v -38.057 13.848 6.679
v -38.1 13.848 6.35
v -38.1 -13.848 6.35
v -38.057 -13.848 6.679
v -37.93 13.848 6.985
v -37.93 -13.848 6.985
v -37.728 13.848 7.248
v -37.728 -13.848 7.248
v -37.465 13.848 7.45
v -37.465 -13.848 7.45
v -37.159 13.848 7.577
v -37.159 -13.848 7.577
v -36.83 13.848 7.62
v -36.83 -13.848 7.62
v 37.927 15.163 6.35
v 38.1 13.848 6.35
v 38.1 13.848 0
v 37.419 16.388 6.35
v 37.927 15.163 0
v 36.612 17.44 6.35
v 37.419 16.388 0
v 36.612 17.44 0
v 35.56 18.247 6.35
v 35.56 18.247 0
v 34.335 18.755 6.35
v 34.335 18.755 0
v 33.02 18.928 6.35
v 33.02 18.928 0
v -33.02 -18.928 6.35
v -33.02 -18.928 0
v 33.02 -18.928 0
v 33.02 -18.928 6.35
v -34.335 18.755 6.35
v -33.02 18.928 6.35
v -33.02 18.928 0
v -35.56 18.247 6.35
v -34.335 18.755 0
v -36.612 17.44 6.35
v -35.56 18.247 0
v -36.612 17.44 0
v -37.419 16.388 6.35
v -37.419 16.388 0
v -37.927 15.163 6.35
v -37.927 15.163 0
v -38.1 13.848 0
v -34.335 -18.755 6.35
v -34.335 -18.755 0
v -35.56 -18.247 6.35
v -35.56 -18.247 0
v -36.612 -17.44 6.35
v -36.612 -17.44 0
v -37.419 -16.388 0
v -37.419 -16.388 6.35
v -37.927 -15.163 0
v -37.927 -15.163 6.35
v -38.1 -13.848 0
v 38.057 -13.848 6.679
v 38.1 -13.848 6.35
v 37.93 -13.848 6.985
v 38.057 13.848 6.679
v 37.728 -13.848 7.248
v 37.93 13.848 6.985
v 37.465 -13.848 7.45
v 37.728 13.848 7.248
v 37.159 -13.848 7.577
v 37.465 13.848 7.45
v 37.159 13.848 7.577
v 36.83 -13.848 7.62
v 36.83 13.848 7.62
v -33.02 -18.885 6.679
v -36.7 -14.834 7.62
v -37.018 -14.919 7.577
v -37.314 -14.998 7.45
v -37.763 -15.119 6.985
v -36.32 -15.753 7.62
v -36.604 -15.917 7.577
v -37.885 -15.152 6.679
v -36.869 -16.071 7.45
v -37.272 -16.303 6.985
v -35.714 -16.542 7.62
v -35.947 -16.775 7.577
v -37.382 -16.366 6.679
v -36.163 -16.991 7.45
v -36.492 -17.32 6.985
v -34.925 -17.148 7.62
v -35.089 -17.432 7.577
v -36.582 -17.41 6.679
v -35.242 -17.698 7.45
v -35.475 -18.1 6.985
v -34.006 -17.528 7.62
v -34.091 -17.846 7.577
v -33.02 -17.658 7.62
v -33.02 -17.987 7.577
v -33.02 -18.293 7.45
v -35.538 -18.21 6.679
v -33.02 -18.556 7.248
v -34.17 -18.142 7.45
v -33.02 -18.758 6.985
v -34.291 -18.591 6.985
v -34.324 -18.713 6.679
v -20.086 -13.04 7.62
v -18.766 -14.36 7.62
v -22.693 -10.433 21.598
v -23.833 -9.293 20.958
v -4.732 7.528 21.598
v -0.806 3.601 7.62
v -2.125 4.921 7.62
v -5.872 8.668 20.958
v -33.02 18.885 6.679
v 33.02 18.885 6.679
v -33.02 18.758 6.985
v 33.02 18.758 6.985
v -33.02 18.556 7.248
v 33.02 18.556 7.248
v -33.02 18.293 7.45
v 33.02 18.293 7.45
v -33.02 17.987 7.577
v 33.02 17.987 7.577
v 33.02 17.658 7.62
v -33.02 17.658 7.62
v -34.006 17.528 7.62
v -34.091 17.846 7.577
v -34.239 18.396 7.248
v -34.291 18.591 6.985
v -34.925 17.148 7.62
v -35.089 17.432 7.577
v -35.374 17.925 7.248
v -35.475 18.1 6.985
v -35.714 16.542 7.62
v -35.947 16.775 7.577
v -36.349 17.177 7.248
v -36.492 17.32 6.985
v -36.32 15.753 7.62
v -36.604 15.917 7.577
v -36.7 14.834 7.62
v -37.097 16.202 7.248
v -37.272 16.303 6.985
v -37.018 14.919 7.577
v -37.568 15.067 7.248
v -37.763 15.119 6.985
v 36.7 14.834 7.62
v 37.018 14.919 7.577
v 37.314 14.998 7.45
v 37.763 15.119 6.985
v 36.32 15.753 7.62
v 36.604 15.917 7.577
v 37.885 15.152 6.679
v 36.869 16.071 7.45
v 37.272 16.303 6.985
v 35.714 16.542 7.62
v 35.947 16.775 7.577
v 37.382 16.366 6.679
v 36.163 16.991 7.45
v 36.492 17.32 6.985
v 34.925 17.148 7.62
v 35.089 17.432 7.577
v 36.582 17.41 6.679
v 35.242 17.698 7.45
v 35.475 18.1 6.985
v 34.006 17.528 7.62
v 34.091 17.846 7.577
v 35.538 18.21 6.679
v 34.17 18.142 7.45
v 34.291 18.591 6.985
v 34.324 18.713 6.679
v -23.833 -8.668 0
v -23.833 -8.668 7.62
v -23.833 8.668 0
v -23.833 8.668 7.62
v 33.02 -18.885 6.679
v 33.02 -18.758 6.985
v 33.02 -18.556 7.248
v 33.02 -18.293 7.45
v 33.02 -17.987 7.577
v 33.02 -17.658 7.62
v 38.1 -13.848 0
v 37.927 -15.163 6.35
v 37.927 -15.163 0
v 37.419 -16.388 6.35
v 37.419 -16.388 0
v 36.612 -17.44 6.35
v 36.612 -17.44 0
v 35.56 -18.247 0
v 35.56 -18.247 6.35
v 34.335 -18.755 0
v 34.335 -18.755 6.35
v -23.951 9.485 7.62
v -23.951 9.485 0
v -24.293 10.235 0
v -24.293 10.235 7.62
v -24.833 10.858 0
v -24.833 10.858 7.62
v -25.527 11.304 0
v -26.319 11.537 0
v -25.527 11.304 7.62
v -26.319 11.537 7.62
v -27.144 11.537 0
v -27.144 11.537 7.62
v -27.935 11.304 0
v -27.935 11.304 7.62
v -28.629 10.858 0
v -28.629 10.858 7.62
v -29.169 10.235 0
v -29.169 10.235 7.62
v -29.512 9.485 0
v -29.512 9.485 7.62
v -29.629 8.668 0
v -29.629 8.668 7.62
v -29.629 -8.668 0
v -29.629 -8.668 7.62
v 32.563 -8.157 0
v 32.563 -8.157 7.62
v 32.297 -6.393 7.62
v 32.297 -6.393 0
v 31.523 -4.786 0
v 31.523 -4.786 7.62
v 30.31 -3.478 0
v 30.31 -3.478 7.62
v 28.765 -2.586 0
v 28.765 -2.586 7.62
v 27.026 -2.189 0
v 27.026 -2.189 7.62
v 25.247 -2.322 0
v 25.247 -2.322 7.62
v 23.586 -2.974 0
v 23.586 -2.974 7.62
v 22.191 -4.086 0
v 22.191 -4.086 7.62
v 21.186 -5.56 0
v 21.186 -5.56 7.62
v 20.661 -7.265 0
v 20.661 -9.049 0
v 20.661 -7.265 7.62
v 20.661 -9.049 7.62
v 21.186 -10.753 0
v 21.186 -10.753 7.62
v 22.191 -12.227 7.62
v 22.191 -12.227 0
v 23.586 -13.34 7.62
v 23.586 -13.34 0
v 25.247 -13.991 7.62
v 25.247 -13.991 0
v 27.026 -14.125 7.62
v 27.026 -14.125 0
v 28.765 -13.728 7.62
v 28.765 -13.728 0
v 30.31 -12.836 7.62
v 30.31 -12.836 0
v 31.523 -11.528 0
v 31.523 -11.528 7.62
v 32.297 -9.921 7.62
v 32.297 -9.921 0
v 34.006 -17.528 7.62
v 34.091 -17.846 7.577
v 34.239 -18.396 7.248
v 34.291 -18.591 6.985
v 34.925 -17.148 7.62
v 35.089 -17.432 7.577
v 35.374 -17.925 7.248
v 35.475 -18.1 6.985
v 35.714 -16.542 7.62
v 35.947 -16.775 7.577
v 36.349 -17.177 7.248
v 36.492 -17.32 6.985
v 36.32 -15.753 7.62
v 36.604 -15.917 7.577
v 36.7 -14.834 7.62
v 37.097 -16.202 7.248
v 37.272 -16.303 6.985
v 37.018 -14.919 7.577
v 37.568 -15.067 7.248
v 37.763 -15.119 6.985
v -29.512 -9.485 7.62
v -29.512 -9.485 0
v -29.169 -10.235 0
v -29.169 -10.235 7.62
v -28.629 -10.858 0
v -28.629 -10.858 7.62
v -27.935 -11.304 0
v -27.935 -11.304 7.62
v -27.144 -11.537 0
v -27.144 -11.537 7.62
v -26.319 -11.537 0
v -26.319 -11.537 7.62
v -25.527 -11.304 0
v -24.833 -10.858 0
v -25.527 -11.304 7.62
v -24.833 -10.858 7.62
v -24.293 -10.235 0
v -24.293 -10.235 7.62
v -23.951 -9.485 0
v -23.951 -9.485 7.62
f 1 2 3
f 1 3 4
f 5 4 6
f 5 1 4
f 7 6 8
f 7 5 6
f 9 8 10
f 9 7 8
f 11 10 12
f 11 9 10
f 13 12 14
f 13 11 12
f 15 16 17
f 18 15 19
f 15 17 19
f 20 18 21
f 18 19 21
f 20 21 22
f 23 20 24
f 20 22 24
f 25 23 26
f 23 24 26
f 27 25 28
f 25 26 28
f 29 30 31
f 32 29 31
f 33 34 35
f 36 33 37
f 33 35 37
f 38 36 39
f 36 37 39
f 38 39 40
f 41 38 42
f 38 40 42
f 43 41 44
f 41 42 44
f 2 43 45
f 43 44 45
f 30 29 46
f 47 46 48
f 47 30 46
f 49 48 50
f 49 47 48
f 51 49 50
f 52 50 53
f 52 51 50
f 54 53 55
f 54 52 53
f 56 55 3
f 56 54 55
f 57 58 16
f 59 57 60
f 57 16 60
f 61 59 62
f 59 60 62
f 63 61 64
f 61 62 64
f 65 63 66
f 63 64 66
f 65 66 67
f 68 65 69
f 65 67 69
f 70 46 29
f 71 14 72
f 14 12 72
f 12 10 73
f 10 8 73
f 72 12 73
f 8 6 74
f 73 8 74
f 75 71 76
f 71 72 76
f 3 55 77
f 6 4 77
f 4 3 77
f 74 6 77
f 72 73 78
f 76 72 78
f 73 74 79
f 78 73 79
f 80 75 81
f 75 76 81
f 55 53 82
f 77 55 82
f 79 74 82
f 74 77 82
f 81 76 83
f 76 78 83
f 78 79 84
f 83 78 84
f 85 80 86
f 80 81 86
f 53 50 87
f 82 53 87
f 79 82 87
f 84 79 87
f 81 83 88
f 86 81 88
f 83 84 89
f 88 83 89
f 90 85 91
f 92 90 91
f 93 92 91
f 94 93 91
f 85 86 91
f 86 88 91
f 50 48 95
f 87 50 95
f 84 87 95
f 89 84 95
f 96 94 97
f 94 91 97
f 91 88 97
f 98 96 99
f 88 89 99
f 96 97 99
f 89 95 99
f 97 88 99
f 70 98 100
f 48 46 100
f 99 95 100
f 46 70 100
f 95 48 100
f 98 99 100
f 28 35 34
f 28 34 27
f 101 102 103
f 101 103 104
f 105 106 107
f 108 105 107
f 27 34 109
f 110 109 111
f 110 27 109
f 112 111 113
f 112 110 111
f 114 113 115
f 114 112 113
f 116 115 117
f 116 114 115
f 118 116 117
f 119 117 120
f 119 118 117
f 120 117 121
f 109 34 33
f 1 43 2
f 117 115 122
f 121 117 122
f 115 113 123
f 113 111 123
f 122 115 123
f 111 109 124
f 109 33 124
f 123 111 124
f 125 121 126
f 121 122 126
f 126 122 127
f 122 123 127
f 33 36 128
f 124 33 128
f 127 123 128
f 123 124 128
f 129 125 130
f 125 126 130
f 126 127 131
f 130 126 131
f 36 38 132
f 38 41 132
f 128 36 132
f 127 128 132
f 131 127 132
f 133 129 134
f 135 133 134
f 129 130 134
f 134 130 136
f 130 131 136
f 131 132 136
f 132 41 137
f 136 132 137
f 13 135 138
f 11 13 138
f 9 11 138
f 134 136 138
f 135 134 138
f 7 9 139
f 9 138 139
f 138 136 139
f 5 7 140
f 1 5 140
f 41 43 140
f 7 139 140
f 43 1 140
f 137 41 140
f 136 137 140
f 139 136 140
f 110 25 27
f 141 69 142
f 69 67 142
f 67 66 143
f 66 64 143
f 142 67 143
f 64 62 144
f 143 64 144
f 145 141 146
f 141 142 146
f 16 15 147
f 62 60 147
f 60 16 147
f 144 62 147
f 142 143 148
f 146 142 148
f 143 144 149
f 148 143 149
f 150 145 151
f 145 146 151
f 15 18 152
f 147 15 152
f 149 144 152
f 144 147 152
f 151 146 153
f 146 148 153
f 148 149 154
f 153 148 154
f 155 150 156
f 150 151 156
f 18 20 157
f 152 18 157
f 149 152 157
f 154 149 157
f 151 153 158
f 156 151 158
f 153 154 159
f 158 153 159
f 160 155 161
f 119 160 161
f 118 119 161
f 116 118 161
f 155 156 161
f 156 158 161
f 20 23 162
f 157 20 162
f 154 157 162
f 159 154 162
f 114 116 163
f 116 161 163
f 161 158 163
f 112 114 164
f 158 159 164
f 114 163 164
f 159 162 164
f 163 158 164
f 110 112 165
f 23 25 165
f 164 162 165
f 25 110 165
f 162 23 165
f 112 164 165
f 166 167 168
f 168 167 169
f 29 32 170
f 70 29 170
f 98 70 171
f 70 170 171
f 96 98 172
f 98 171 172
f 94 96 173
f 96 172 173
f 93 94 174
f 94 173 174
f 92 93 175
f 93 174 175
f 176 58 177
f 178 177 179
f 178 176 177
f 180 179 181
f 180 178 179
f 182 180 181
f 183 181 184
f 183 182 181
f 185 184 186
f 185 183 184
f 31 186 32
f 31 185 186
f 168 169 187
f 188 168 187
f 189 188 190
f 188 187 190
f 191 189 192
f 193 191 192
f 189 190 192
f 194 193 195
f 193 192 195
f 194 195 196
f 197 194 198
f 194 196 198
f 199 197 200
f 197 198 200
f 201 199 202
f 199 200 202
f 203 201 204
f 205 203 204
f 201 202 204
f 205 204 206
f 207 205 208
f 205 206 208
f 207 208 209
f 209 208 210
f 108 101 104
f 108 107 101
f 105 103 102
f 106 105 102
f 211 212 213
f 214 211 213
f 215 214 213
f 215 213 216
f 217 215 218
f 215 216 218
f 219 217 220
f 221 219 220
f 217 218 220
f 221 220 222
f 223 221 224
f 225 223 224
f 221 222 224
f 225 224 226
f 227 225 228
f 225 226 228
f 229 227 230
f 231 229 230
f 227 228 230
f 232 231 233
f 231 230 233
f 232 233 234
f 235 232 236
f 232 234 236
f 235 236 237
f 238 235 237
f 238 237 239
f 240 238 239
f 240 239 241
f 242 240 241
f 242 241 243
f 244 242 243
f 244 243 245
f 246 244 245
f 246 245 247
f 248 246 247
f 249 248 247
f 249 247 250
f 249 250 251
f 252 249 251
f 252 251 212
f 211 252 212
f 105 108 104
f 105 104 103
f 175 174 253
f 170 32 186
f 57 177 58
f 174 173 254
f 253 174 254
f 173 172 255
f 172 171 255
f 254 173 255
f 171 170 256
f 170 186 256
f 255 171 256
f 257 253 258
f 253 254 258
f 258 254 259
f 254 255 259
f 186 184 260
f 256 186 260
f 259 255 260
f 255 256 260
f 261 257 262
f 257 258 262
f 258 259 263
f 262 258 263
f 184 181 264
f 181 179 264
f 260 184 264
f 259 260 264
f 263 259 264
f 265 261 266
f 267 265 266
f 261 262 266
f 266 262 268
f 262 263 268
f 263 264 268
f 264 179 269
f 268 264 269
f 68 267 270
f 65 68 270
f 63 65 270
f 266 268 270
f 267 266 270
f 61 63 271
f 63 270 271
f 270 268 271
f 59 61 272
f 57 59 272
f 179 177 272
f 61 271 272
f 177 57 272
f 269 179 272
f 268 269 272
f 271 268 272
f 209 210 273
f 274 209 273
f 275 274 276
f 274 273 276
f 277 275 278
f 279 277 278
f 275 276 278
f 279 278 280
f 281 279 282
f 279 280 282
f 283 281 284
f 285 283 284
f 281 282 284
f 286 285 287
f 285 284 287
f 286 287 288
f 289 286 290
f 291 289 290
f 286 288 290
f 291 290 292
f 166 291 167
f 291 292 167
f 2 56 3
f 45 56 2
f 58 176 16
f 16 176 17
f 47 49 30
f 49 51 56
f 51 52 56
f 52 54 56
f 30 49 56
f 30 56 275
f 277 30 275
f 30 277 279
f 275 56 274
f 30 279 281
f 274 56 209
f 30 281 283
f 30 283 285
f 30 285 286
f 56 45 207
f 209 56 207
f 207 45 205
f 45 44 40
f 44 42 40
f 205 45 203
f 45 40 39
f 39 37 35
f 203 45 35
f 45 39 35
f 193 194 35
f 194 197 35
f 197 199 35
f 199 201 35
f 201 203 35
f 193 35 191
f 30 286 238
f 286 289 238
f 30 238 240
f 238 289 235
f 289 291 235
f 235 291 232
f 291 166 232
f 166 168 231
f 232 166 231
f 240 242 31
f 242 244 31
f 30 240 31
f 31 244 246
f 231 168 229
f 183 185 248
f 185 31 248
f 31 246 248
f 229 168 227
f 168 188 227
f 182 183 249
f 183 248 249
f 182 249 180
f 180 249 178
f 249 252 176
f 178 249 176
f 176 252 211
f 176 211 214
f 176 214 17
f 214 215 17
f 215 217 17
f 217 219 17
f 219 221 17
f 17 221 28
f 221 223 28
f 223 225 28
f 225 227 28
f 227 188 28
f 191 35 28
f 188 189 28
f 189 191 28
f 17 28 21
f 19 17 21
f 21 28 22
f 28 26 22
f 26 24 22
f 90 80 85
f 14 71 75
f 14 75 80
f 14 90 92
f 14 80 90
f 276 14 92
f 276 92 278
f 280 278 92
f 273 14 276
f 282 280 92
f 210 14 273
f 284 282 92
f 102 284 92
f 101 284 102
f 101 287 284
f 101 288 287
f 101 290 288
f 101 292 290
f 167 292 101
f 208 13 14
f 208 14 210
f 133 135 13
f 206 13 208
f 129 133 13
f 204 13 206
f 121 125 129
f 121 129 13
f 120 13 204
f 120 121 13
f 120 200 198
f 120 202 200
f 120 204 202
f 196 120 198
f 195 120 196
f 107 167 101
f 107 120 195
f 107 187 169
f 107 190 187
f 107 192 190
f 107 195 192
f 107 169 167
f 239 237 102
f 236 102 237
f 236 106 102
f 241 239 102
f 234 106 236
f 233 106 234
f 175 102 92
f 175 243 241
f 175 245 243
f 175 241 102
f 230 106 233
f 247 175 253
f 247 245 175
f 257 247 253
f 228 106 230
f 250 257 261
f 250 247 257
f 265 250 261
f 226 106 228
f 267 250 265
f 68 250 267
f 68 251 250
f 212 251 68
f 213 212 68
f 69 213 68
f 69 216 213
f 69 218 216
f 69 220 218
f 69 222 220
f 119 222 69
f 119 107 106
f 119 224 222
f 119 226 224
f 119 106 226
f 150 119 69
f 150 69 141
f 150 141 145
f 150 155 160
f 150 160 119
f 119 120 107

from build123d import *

# Parameters (mm, degrees)
F0_W         = 76.2
F0_H         = 37.856084797
F1_DEPTH     = 7.62
F2_R         = 1.27
F3_T1_DEPTH  = 20.32
F3_T4_ANGLE  = 90
F3_T6_ANGLE  = 90
F3_T8_ANGLE  = 90
F3_T10_ANGLE = 90
F5_DEPTH     = 25.4
F6_R         = 5.9846476777
F7_DEPTH     = 25.4
F10_DEPTH    = 12.7


# Not quite as in the source:
# - a fillet or chamfer that OpenCascade refuses, or shapes differently, is made with other operations: its cross-section is extruded or revolved along the edge and cut away or added


with BuildPart() as f1:
    # F0 (on Top) → F1 (new body)
    with BuildSketch(Plane.XY):
        Rectangle(F0_W, F0_H)
    extrude(amount=F1_DEPTH)

    # F2
    f2_edges = [f1.edges().sort_by_distance(p)[0] for p in [
        (-38.1, 0, 7.62),
        (0, 18.928042, 7.62),
        (38.1, 0, 7.62),
        (0, -18.928042, 7.62),
    ]]
    fillet(f2_edges, radius=F2_R)

    # F3: fillet of radius 5.08 on 4 edges, made by hand

    # F3_s2 → F3_t1 (cut)
    with BuildSketch(Plane.XY.offset(-12.7)):
        with BuildLine():
            ThreePointArc((-33.02, -18.9280423985), (-36.6121024484, -17.4401448469), (-38.1, -13.8480423985))
            Line((-38.1, -13.8480423985), (-38.1, -18.9280423985))
            Line((-38.1, -18.9280423985), (-33.02, -18.9280423985))
        make_face()
        with BuildLine():
            ThreePointArc((-33.02, 18.9280423985), (-36.6121024484, 17.4401448469), (-38.1, 13.8480423985))
            Line((-38.1, 13.8480423985), (-38.1, 18.9280423985))
            Line((-38.1, 18.9280423985), (-33.02, 18.9280423985))
        make_face()
        with BuildLine():
            ThreePointArc((38.1, 13.8480423985), (36.6121024484, 17.4401448469), (33.02, 18.9280423985))
            Line((33.02, 18.9280423985), (38.1, 18.9280423985))
            Line((38.1, 18.9280423985), (38.1, 13.8480423985))
        make_face()
        with BuildLine():
            ThreePointArc((38.1, -13.8480423985), (36.6121024484, -17.4401448469), (33.02, -18.9280423985))
            Line((33.02, -18.9280423985), (38.1, -18.9280423985))
            Line((38.1, -18.9280423985), (38.1, -13.8480423985))
        make_face()
    extrude(amount=F3_T1_DEPTH, mode=Mode.SUBTRACT)

    # F3_s3 → F3_t4 (revolve, cut)
    with BuildSketch(Plane.YZ.offset(33.02)):
        with BuildLine():
            ThreePointArc((-17.6580423985, 7.62), (-18.5560680106, 7.2480256121), (-18.9280423985, 6.35))
            Line((-18.9280423985, 6.35), (-18.9280423985, 7.62))
            Line((-18.9280423985, 7.62), (-17.6580423985, 7.62))
        make_face()
    revolve(axis=Axis((33.02, -13.8480423985, 7.62), (0, 0, 1)), revolution_arc=F3_T4_ANGLE, mode=Mode.SUBTRACT)

    # F3_s5 → F3_t6 (revolve, cut)
    with BuildSketch(Plane.XZ.offset(-13.8480423985)):
        with BuildLine():
            ThreePointArc((36.83, 7.62), (37.7280256121, 7.2480256121), (38.1, 6.35))
            Line((38.1, 6.35), (38.1, 7.62))
            Line((38.1, 7.62), (36.83, 7.62))
        make_face()
    revolve(axis=Axis((33.02, 13.8480423985, 7.62), (0, 0, 1)), revolution_arc=F3_T6_ANGLE, mode=Mode.SUBTRACT)

    # F3_s7 → F3_t8 (revolve, cut)
    with BuildSketch(Plane.YZ.offset(-33.02)):
        with BuildLine():
            ThreePointArc((17.6580423985, 7.62), (18.5560680106, 7.2480256121), (18.9280423985, 6.35))
            Line((18.9280423985, 6.35), (18.9280423985, 7.62))
            Line((18.9280423985, 7.62), (17.6580423985, 7.62))
        make_face()
    revolve(axis=Axis((-33.02, 13.8480423985, 7.62), (0, 0, 1)), revolution_arc=F3_T8_ANGLE, mode=Mode.SUBTRACT)

    # F3_s9 → F3_t10 (revolve, cut)
    with BuildSketch(Plane.XZ.offset(13.8480423985)):
        with BuildLine():
            ThreePointArc((-36.83, 7.62), (-37.7280256121, 7.2480256121), (-38.1, 6.35))
            Line((-38.1, 6.35), (-38.1, 7.62))
            Line((-38.1, 7.62), (-36.83, 7.62))
        make_face()
    revolve(axis=Axis((-33.02, -13.8480423985, 7.62), (0, 0, 1)), revolution_arc=F3_T10_ANGLE, mode=Mode.SUBTRACT)

    # F4 (on face) → F5 (cut)
    with BuildSketch(Plane.XY.offset(7.62)):
        with BuildLine():
            Line((-29.6291131526, 8.6681647226), (-29.6291131526, 0))
            Line((-29.6291131526, 0), (-29.6291131526, -8.6681647226))
            ThreePointArc((-29.6291131526, -8.6681647226), (-26.7311763018, -11.5661015734), (-23.8332394511, -8.6681647226))
            Line((-23.8332394511, -8.6681647226), (-23.8332394511, 0))
            Line((-23.8332394511, 0), (-23.8332394511, 8.6681647226))
            ThreePointArc((-23.8332394511, 8.6681647226), (-26.7311763018, 11.5661015734), (-29.6291131526, 8.6681647226))
        make_face()
    extrude(amount=-F5_DEPTH, mode=Mode.SUBTRACT)

    # F6 (on face) → F7 (cut)
    with BuildSketch(Plane.XY.offset(7.62)):
        with Locations((26.5783518553, -8.1568043679)):
            Circle(F6_R)
    extrude(amount=-F7_DEPTH, mode=Mode.SUBTRACT)

    # F9 (on face) → F10 (join, symmetric)
    with BuildSketch(Plane(origin=(-7.5825373642, -7.5825373642, 0), x_dir=(-0.7071067812, 0.7071067812, 0), z_dir=(0.7071067812, 0.7071067812, 0))):
        Polygon((4.9822961397, 7.62), (10.2810509175, 20.9576525145), (8.66903996, 21.5980688662), (3.1158619095, 7.62), align=None)
    extrude(amount=F10_DEPTH, both=True)


solid = f1.part
